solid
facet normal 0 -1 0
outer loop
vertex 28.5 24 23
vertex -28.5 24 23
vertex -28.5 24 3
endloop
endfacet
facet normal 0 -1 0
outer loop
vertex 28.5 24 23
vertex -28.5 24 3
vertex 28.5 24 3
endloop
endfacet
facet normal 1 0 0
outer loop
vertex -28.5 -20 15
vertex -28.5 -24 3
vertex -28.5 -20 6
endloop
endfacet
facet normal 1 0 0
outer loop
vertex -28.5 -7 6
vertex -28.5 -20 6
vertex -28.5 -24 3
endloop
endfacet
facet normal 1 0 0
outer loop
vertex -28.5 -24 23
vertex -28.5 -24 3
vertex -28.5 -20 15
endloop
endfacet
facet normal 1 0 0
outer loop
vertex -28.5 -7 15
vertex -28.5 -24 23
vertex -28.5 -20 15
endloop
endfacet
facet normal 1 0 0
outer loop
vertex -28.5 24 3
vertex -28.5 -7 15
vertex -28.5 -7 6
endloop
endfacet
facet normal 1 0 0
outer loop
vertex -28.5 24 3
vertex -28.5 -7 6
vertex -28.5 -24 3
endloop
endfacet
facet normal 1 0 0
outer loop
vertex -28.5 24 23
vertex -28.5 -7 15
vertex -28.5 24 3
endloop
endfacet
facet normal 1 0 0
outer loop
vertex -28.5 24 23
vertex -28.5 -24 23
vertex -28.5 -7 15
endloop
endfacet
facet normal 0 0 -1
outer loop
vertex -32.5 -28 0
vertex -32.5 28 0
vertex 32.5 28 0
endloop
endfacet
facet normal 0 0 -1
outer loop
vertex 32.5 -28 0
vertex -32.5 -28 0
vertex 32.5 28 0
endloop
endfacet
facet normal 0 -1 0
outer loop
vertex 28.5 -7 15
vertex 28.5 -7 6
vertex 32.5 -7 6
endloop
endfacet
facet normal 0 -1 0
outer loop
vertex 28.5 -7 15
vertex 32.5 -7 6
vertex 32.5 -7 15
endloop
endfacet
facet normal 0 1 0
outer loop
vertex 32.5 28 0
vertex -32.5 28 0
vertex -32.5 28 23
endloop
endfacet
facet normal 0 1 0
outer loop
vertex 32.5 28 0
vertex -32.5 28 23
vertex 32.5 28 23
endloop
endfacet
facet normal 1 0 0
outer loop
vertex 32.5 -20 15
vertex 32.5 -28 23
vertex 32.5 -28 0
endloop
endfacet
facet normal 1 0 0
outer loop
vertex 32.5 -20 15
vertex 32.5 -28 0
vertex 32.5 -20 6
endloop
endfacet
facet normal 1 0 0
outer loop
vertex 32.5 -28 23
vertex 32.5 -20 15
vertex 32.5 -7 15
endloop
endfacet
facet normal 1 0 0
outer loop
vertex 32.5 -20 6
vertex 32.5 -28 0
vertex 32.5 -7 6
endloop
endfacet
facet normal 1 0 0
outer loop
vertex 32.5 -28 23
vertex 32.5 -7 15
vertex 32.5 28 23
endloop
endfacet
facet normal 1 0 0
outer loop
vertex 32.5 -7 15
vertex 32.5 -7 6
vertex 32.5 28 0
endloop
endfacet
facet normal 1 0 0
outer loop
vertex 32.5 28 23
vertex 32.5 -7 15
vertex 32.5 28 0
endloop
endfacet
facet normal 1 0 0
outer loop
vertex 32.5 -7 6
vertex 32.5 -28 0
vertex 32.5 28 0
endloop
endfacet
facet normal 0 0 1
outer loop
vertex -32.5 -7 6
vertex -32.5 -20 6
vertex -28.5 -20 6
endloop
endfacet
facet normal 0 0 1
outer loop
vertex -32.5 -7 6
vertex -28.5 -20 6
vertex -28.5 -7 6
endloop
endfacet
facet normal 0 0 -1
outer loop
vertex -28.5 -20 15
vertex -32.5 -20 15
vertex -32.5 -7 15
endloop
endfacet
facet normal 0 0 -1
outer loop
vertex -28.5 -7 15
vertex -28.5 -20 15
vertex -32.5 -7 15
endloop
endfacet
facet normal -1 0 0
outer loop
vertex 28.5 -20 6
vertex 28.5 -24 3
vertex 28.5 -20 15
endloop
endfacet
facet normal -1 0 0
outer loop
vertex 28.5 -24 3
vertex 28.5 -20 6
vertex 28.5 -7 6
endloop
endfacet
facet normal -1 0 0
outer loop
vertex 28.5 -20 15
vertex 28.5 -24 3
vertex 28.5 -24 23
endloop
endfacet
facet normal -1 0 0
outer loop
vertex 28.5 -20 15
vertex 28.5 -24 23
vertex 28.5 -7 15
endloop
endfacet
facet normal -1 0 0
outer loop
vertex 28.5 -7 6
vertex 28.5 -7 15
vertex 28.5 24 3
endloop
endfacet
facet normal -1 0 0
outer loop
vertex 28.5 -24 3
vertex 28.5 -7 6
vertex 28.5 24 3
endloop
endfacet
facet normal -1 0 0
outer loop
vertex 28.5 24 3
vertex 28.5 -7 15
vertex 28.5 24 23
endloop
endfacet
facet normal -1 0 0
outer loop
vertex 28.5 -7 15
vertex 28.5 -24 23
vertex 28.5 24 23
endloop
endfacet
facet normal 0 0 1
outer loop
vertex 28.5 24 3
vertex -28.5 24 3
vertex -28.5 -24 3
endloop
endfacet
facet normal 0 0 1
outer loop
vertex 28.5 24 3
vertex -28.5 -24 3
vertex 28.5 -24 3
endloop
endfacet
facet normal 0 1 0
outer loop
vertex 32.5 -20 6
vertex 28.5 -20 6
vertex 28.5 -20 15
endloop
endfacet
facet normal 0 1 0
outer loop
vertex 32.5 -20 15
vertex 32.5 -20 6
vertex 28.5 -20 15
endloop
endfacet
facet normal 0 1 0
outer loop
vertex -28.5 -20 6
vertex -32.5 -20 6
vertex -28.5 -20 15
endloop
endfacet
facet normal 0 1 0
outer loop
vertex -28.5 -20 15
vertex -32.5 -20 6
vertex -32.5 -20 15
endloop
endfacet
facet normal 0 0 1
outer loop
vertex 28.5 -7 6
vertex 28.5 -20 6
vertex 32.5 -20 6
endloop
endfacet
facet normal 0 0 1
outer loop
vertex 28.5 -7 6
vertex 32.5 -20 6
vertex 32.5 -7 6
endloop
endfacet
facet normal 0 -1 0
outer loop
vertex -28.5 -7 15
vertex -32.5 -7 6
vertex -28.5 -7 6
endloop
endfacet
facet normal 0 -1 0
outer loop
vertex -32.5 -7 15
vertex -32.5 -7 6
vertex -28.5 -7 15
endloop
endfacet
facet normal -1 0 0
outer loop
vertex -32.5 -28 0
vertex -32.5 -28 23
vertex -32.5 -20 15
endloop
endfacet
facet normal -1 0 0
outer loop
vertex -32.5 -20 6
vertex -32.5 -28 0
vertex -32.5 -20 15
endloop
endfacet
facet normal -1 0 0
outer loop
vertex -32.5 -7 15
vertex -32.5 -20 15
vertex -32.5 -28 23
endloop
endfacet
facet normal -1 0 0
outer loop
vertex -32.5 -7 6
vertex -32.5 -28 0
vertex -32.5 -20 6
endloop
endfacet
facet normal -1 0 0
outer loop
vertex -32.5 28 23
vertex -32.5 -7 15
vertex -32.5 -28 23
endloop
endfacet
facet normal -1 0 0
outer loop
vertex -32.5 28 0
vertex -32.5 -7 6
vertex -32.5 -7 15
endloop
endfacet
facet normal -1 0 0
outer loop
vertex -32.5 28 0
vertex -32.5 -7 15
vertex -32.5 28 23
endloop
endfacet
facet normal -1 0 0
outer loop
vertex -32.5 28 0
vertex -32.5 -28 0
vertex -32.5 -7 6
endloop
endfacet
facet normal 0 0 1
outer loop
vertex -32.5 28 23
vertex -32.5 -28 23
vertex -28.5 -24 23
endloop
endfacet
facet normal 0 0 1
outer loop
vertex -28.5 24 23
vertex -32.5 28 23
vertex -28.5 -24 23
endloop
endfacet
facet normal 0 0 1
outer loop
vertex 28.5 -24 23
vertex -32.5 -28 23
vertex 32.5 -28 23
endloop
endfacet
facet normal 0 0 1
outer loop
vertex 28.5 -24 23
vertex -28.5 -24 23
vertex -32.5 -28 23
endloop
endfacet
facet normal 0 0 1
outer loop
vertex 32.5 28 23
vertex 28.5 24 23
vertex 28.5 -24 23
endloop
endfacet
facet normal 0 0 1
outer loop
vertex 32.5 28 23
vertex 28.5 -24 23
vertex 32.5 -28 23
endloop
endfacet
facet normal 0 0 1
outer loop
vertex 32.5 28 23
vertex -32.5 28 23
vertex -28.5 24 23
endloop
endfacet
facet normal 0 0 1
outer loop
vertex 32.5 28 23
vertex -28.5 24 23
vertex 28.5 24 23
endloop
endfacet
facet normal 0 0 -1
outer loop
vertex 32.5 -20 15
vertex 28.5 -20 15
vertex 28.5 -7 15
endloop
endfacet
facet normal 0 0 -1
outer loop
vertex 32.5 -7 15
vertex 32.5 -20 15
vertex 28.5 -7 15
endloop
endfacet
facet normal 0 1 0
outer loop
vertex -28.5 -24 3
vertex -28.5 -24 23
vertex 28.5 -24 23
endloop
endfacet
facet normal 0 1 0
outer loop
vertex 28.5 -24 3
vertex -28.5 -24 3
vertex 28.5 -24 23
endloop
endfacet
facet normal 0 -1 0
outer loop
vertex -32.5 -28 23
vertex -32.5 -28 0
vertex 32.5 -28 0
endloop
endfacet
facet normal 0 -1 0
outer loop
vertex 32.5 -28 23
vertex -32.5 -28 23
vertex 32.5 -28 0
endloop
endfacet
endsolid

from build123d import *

# Parameters (mm, degrees)
SKETCH1_W           = 65
SKETCH1_H           = 56
BOSS_EXTRUDE1_DEPTH = 23
SKETCH2_W           = 57
SKETCH2_H           = 48
CUT_EXTRUDE1_DEPTH  = 20
SKETCH5_W           = 9
SKETCH5_H           = 13
CUT_EXTRUDE2_DEPTH  = 75.417739821


with BuildPart() as part:
    # Sketch1 → Boss-Extrude1 (new body)
    with BuildSketch(Plane.XY):
        Rectangle(SKETCH1_W, SKETCH1_H)
    extrude(amount=BOSS_EXTRUDE1_DEPTH)

    # Sketch2 → Cut-Extrude1 (cut)
    with BuildSketch(Plane.XY.offset(23)):
        Rectangle(SKETCH2_W, SKETCH2_H)
    extrude(amount=-CUT_EXTRUDE1_DEPTH, mode=Mode.SUBTRACT)

    # Sketch5 → Cut-Extrude2 (cut, through all)
    with BuildSketch(Plane.ZY.offset(32.5)):
        with Locations((10.5, -13.5)):
            Rectangle(SKETCH5_W, SKETCH5_H)
    extrude(amount=-CUT_EXTRUDE2_DEPTH, mode=Mode.SUBTRACT)


solid = part.part
